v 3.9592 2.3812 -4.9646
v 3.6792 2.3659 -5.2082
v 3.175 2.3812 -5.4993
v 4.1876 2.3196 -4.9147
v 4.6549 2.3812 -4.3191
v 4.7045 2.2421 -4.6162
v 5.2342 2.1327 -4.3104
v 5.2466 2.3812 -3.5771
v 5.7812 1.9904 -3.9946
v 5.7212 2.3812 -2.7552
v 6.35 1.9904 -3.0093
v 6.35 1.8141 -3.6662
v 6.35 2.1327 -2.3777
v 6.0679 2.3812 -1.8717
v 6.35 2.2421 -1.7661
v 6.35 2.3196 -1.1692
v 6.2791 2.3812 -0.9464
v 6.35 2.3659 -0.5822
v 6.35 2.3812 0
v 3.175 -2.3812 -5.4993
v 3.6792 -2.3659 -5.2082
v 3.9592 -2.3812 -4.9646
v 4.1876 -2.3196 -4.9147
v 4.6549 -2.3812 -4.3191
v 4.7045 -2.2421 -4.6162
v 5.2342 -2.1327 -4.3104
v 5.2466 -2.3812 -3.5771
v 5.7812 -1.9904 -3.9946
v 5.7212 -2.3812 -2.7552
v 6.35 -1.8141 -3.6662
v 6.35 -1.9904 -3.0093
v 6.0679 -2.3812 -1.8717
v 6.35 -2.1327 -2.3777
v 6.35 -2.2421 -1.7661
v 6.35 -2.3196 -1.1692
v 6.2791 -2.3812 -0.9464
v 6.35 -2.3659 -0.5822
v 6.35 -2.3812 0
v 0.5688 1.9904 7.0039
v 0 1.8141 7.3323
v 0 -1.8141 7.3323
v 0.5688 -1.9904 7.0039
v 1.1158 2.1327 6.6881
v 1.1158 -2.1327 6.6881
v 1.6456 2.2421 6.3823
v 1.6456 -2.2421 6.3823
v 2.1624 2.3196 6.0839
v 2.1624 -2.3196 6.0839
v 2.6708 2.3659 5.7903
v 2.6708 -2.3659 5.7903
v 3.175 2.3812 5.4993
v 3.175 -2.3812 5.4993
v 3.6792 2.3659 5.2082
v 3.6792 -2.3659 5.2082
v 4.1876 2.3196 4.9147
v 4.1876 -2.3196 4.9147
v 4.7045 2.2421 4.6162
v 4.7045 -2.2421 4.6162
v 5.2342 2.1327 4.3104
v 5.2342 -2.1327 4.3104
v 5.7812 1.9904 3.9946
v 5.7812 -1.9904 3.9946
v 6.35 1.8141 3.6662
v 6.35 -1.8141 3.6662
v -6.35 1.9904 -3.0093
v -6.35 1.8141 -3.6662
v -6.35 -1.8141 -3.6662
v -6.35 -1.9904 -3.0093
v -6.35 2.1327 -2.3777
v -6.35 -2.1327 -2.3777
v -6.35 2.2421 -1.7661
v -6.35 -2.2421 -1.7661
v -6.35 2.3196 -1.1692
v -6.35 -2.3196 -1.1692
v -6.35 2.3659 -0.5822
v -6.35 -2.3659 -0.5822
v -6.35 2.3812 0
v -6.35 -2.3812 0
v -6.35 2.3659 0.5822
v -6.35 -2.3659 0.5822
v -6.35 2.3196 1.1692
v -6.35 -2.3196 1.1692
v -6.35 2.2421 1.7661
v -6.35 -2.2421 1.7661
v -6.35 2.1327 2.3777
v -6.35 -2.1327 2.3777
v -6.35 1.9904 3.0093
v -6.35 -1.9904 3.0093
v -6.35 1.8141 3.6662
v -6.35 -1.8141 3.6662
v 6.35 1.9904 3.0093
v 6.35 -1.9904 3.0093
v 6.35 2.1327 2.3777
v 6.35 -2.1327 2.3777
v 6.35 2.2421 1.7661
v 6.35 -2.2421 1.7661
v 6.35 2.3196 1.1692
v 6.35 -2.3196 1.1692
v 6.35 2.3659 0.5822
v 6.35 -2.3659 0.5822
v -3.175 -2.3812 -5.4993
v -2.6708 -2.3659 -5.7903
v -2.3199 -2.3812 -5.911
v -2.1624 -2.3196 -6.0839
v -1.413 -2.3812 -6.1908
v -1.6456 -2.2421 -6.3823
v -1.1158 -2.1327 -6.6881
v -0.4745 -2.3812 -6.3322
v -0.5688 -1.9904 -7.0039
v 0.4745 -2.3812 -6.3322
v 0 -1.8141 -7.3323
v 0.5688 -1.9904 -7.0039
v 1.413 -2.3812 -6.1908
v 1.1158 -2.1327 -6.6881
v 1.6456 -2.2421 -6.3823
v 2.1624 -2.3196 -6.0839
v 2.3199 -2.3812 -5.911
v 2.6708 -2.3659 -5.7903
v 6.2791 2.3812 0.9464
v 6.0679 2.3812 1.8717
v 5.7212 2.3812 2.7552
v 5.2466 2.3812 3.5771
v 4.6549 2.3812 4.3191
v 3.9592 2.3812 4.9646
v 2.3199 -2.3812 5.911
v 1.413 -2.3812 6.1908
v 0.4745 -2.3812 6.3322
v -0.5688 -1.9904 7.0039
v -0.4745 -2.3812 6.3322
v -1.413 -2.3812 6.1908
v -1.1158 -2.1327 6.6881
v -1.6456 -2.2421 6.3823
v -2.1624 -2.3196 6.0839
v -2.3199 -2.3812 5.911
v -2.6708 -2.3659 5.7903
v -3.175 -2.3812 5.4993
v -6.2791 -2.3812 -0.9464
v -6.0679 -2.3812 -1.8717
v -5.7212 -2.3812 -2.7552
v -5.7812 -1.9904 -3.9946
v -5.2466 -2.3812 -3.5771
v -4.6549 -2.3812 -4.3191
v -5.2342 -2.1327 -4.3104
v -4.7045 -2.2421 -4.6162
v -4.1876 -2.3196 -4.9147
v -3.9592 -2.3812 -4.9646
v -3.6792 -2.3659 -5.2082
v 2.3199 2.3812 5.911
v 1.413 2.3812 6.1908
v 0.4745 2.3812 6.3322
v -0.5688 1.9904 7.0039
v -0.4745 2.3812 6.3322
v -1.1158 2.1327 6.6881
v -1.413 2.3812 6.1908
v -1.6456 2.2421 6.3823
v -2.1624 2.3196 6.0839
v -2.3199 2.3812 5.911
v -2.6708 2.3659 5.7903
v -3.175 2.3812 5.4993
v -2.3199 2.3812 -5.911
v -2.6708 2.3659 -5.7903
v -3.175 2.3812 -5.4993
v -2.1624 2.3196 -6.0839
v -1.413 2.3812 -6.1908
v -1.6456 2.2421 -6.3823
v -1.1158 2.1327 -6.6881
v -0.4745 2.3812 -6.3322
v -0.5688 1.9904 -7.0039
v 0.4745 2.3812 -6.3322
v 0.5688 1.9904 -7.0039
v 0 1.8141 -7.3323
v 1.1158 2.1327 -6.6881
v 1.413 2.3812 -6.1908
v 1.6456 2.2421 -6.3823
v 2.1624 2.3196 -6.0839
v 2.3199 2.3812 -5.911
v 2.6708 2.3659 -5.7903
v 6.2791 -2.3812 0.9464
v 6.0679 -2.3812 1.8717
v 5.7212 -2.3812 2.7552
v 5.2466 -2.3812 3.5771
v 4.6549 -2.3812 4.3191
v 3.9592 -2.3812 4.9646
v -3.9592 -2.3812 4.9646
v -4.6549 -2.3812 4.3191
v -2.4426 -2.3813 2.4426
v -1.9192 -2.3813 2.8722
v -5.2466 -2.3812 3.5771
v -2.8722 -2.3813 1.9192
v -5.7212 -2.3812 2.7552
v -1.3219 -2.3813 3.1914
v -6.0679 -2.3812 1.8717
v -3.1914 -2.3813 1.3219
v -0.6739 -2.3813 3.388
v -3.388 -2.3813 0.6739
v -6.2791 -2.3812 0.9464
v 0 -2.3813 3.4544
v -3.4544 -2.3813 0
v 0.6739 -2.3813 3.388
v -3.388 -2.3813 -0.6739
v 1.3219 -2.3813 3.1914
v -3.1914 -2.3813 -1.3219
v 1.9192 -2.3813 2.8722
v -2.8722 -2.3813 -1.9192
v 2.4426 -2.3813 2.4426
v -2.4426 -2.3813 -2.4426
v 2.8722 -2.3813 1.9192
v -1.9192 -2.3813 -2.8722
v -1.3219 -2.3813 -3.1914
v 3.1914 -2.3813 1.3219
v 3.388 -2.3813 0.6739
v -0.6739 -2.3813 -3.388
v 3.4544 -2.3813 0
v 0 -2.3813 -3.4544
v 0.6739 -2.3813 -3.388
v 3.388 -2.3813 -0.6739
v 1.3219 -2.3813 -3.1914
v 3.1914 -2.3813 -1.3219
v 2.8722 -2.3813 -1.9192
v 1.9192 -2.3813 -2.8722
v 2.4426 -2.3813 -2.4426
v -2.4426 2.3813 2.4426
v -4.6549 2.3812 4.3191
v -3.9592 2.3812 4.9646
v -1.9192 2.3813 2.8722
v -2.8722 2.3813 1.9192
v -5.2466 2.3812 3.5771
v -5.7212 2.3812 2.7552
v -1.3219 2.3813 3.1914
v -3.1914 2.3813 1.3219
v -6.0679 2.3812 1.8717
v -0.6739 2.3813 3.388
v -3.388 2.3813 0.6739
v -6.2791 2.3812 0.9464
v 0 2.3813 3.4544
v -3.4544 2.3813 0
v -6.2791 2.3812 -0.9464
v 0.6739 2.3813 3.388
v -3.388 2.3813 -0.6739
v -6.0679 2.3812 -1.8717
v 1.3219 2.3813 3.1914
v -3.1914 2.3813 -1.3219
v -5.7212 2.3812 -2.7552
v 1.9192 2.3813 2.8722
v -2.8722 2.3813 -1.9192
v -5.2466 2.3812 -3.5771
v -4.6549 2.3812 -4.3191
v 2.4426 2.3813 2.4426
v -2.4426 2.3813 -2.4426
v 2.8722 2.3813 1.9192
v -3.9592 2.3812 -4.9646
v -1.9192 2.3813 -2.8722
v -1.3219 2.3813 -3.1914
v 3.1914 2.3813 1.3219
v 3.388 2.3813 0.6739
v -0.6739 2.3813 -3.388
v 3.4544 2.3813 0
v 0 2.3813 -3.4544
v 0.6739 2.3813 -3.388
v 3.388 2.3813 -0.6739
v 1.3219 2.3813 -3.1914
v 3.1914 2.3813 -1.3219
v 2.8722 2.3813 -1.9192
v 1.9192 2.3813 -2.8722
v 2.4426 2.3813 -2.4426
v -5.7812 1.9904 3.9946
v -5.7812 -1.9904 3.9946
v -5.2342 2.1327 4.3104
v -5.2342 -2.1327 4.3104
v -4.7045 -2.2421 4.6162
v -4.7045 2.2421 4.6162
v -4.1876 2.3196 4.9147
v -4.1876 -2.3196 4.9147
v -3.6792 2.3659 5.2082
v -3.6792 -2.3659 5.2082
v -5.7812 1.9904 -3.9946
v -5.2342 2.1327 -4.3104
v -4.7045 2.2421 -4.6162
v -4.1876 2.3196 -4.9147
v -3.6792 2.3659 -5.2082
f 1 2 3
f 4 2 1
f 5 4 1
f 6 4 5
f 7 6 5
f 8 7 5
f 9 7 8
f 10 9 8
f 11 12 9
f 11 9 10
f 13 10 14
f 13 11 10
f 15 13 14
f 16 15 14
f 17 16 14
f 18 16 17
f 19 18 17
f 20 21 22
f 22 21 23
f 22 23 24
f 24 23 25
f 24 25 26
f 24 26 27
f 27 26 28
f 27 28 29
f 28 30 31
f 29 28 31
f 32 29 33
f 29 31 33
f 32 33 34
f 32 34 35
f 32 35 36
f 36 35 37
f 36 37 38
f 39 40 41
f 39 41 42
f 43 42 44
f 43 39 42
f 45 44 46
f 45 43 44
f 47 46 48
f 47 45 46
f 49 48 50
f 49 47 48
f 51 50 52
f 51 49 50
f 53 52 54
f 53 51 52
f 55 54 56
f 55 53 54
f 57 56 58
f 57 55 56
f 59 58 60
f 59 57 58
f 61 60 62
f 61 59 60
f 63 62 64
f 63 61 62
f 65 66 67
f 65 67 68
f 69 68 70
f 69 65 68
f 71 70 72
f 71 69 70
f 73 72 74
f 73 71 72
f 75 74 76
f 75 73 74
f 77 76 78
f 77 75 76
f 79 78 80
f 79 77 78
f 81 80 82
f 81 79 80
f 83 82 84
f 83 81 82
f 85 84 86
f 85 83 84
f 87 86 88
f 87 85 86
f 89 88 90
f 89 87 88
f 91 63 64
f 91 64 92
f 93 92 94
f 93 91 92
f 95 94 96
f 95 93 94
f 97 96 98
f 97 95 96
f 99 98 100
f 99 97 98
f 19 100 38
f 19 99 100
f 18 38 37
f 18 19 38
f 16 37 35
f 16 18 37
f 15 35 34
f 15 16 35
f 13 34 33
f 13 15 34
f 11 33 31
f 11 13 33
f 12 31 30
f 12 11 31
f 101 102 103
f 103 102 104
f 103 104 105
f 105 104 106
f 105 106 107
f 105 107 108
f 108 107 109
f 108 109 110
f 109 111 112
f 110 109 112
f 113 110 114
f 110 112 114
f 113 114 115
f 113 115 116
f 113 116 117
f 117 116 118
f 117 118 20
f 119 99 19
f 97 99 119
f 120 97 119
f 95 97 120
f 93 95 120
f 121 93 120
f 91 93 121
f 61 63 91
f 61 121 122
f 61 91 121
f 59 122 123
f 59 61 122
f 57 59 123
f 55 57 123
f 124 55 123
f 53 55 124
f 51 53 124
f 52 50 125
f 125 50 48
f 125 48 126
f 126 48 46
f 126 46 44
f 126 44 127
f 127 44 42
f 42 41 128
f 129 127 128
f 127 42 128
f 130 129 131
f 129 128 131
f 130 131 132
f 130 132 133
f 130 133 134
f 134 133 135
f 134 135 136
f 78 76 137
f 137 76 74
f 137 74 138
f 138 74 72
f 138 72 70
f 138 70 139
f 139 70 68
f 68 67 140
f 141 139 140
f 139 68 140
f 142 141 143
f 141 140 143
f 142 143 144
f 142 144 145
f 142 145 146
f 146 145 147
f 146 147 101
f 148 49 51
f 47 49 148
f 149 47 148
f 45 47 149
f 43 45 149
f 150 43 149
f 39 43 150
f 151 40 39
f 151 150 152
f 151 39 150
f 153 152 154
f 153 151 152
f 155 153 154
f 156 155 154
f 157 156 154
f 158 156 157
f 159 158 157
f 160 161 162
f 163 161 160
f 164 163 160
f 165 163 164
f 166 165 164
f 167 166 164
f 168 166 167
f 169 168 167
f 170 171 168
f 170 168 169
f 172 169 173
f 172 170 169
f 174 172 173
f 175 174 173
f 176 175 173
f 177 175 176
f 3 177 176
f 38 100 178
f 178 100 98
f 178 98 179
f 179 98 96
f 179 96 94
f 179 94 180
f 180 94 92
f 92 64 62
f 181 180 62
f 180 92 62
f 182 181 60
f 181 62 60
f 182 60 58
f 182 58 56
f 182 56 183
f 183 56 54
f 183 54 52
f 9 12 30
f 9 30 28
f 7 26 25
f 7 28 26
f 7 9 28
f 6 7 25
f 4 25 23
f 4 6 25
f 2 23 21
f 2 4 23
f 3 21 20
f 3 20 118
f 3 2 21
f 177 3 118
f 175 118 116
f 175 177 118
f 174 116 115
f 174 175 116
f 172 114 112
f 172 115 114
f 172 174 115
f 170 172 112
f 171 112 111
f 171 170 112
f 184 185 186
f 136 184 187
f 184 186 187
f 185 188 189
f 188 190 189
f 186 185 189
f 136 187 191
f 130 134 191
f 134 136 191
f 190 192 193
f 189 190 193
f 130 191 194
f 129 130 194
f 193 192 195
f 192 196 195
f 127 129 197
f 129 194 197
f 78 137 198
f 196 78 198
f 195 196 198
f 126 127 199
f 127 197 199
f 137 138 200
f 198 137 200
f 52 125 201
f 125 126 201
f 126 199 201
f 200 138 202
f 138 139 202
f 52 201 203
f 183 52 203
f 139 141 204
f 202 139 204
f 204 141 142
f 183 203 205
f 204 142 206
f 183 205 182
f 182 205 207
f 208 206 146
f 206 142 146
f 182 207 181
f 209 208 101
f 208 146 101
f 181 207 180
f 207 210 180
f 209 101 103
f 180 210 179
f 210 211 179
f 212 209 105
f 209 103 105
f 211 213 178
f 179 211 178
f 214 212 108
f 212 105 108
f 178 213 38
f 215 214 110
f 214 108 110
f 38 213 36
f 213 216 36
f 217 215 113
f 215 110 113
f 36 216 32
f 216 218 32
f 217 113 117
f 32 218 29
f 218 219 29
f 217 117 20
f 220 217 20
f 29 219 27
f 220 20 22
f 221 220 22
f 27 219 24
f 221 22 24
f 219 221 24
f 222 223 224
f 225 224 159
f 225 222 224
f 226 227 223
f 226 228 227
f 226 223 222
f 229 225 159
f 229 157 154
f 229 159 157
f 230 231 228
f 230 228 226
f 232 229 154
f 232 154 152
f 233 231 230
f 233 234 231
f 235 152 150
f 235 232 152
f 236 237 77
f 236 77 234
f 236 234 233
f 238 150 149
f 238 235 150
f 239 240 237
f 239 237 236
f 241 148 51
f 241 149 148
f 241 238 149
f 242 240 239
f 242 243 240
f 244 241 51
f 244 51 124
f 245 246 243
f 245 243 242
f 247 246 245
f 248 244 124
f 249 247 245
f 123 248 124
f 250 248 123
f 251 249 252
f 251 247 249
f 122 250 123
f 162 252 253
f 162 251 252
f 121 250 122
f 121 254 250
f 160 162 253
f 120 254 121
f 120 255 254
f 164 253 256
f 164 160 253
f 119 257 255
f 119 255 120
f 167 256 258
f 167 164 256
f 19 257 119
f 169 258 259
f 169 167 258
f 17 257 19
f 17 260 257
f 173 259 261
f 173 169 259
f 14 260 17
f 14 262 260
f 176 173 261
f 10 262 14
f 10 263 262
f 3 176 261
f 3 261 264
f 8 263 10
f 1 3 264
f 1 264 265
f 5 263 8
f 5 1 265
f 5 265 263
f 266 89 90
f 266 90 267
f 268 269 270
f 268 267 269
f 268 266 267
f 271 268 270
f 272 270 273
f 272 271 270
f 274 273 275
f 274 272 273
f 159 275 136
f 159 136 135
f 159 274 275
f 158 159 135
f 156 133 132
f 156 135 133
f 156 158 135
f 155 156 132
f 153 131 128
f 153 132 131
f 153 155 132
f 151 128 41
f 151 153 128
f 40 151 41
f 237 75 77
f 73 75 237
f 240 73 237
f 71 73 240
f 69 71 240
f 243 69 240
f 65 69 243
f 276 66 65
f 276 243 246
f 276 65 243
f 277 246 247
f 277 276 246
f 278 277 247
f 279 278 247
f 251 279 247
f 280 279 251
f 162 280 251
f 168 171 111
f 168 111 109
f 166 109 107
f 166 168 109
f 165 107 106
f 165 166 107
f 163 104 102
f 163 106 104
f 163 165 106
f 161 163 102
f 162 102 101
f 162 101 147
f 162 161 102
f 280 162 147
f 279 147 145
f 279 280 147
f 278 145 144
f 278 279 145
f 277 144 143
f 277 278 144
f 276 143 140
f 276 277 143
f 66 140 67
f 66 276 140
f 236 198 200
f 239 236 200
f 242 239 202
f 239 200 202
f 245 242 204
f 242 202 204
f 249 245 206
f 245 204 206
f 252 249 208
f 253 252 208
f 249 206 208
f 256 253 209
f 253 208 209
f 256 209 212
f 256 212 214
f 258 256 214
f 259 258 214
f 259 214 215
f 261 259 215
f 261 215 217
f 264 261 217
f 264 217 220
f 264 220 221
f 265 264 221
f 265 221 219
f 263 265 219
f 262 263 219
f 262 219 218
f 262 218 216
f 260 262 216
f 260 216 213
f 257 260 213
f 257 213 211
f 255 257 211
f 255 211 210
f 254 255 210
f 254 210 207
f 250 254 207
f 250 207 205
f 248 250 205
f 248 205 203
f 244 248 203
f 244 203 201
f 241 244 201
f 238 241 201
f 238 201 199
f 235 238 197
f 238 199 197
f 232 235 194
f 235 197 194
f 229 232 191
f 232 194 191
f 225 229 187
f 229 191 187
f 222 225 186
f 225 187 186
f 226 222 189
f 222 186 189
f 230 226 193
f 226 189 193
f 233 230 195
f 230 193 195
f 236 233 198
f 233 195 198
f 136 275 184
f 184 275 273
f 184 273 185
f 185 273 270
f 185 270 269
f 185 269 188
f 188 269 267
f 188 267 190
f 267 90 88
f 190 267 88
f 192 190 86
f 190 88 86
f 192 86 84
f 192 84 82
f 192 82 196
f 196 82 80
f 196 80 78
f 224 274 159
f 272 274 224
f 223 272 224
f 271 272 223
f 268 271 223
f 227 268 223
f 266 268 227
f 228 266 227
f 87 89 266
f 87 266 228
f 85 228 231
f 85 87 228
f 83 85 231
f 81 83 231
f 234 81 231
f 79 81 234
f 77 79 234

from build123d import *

# Parameters (mm, degrees)
BOSS_EXTRUDE1_DEPTH      = 2.38125
F_5_16_24_TAPPED_HOLE1_D = 6.9088
SKETCH5_OUTSIDE_W        = 38.658
SKETCH5_OUTSIDE_H        = 40.622
SKETCH5_OUTSIDE_R        = 6.35
CUT_EXTRUDE2_DEPTH       = 5.7625
CUT_EXTRUDE2_TAPER       = 60


with BuildPart() as part:
    # Sketch1 → Boss-Extrude1 (new body, symmetric)
    with BuildSketch(Plane(origin=(0, 0, 0), x_dir=(1, 0, 0), z_dir=(0, 1, 0))):
        Polygon((-6.35, 3.666174209), (-6.35, -3.666174209), (0, -7.332348419), (6.35, -3.666174209), (6.35, 3.666174209), (0, 7.332348419), align=None)
    extrude(amount=BOSS_EXTRUDE1_DEPTH, both=True)

    # 5/16-24 Tapped Hole1 (through all)
    with Locations(Plane(origin=(0, 2.38125, 0), x_dir=(1, 0, 0), z_dir=(0, 1, 0))):
        with Locations((0, 0)):
            Hole(F_5_16_24_TAPPED_HOLE1_D / 2)

    # Sketch5 outside → Cut-Extrude2 (cut, through all)
    with BuildSketch(Plane(origin=(0, 2.38125, 0), x_dir=(1, 0, 0), z_dir=(0, 1, 0))):
        Rectangle(SKETCH5_OUTSIDE_W, SKETCH5_OUTSIDE_H)
        Circle(SKETCH5_OUTSIDE_R, mode=Mode.SUBTRACT)
    cut_extrude2 = extrude(amount=-CUT_EXTRUDE2_DEPTH, taper=CUT_EXTRUDE2_TAPER, mode=Mode.SUBTRACT)

    # Mirror1: Cut-Extrude2 across plane
    add(cut_extrude2.mirror(Plane.ZX), mode=Mode.SUBTRACT)


solid = part.part
